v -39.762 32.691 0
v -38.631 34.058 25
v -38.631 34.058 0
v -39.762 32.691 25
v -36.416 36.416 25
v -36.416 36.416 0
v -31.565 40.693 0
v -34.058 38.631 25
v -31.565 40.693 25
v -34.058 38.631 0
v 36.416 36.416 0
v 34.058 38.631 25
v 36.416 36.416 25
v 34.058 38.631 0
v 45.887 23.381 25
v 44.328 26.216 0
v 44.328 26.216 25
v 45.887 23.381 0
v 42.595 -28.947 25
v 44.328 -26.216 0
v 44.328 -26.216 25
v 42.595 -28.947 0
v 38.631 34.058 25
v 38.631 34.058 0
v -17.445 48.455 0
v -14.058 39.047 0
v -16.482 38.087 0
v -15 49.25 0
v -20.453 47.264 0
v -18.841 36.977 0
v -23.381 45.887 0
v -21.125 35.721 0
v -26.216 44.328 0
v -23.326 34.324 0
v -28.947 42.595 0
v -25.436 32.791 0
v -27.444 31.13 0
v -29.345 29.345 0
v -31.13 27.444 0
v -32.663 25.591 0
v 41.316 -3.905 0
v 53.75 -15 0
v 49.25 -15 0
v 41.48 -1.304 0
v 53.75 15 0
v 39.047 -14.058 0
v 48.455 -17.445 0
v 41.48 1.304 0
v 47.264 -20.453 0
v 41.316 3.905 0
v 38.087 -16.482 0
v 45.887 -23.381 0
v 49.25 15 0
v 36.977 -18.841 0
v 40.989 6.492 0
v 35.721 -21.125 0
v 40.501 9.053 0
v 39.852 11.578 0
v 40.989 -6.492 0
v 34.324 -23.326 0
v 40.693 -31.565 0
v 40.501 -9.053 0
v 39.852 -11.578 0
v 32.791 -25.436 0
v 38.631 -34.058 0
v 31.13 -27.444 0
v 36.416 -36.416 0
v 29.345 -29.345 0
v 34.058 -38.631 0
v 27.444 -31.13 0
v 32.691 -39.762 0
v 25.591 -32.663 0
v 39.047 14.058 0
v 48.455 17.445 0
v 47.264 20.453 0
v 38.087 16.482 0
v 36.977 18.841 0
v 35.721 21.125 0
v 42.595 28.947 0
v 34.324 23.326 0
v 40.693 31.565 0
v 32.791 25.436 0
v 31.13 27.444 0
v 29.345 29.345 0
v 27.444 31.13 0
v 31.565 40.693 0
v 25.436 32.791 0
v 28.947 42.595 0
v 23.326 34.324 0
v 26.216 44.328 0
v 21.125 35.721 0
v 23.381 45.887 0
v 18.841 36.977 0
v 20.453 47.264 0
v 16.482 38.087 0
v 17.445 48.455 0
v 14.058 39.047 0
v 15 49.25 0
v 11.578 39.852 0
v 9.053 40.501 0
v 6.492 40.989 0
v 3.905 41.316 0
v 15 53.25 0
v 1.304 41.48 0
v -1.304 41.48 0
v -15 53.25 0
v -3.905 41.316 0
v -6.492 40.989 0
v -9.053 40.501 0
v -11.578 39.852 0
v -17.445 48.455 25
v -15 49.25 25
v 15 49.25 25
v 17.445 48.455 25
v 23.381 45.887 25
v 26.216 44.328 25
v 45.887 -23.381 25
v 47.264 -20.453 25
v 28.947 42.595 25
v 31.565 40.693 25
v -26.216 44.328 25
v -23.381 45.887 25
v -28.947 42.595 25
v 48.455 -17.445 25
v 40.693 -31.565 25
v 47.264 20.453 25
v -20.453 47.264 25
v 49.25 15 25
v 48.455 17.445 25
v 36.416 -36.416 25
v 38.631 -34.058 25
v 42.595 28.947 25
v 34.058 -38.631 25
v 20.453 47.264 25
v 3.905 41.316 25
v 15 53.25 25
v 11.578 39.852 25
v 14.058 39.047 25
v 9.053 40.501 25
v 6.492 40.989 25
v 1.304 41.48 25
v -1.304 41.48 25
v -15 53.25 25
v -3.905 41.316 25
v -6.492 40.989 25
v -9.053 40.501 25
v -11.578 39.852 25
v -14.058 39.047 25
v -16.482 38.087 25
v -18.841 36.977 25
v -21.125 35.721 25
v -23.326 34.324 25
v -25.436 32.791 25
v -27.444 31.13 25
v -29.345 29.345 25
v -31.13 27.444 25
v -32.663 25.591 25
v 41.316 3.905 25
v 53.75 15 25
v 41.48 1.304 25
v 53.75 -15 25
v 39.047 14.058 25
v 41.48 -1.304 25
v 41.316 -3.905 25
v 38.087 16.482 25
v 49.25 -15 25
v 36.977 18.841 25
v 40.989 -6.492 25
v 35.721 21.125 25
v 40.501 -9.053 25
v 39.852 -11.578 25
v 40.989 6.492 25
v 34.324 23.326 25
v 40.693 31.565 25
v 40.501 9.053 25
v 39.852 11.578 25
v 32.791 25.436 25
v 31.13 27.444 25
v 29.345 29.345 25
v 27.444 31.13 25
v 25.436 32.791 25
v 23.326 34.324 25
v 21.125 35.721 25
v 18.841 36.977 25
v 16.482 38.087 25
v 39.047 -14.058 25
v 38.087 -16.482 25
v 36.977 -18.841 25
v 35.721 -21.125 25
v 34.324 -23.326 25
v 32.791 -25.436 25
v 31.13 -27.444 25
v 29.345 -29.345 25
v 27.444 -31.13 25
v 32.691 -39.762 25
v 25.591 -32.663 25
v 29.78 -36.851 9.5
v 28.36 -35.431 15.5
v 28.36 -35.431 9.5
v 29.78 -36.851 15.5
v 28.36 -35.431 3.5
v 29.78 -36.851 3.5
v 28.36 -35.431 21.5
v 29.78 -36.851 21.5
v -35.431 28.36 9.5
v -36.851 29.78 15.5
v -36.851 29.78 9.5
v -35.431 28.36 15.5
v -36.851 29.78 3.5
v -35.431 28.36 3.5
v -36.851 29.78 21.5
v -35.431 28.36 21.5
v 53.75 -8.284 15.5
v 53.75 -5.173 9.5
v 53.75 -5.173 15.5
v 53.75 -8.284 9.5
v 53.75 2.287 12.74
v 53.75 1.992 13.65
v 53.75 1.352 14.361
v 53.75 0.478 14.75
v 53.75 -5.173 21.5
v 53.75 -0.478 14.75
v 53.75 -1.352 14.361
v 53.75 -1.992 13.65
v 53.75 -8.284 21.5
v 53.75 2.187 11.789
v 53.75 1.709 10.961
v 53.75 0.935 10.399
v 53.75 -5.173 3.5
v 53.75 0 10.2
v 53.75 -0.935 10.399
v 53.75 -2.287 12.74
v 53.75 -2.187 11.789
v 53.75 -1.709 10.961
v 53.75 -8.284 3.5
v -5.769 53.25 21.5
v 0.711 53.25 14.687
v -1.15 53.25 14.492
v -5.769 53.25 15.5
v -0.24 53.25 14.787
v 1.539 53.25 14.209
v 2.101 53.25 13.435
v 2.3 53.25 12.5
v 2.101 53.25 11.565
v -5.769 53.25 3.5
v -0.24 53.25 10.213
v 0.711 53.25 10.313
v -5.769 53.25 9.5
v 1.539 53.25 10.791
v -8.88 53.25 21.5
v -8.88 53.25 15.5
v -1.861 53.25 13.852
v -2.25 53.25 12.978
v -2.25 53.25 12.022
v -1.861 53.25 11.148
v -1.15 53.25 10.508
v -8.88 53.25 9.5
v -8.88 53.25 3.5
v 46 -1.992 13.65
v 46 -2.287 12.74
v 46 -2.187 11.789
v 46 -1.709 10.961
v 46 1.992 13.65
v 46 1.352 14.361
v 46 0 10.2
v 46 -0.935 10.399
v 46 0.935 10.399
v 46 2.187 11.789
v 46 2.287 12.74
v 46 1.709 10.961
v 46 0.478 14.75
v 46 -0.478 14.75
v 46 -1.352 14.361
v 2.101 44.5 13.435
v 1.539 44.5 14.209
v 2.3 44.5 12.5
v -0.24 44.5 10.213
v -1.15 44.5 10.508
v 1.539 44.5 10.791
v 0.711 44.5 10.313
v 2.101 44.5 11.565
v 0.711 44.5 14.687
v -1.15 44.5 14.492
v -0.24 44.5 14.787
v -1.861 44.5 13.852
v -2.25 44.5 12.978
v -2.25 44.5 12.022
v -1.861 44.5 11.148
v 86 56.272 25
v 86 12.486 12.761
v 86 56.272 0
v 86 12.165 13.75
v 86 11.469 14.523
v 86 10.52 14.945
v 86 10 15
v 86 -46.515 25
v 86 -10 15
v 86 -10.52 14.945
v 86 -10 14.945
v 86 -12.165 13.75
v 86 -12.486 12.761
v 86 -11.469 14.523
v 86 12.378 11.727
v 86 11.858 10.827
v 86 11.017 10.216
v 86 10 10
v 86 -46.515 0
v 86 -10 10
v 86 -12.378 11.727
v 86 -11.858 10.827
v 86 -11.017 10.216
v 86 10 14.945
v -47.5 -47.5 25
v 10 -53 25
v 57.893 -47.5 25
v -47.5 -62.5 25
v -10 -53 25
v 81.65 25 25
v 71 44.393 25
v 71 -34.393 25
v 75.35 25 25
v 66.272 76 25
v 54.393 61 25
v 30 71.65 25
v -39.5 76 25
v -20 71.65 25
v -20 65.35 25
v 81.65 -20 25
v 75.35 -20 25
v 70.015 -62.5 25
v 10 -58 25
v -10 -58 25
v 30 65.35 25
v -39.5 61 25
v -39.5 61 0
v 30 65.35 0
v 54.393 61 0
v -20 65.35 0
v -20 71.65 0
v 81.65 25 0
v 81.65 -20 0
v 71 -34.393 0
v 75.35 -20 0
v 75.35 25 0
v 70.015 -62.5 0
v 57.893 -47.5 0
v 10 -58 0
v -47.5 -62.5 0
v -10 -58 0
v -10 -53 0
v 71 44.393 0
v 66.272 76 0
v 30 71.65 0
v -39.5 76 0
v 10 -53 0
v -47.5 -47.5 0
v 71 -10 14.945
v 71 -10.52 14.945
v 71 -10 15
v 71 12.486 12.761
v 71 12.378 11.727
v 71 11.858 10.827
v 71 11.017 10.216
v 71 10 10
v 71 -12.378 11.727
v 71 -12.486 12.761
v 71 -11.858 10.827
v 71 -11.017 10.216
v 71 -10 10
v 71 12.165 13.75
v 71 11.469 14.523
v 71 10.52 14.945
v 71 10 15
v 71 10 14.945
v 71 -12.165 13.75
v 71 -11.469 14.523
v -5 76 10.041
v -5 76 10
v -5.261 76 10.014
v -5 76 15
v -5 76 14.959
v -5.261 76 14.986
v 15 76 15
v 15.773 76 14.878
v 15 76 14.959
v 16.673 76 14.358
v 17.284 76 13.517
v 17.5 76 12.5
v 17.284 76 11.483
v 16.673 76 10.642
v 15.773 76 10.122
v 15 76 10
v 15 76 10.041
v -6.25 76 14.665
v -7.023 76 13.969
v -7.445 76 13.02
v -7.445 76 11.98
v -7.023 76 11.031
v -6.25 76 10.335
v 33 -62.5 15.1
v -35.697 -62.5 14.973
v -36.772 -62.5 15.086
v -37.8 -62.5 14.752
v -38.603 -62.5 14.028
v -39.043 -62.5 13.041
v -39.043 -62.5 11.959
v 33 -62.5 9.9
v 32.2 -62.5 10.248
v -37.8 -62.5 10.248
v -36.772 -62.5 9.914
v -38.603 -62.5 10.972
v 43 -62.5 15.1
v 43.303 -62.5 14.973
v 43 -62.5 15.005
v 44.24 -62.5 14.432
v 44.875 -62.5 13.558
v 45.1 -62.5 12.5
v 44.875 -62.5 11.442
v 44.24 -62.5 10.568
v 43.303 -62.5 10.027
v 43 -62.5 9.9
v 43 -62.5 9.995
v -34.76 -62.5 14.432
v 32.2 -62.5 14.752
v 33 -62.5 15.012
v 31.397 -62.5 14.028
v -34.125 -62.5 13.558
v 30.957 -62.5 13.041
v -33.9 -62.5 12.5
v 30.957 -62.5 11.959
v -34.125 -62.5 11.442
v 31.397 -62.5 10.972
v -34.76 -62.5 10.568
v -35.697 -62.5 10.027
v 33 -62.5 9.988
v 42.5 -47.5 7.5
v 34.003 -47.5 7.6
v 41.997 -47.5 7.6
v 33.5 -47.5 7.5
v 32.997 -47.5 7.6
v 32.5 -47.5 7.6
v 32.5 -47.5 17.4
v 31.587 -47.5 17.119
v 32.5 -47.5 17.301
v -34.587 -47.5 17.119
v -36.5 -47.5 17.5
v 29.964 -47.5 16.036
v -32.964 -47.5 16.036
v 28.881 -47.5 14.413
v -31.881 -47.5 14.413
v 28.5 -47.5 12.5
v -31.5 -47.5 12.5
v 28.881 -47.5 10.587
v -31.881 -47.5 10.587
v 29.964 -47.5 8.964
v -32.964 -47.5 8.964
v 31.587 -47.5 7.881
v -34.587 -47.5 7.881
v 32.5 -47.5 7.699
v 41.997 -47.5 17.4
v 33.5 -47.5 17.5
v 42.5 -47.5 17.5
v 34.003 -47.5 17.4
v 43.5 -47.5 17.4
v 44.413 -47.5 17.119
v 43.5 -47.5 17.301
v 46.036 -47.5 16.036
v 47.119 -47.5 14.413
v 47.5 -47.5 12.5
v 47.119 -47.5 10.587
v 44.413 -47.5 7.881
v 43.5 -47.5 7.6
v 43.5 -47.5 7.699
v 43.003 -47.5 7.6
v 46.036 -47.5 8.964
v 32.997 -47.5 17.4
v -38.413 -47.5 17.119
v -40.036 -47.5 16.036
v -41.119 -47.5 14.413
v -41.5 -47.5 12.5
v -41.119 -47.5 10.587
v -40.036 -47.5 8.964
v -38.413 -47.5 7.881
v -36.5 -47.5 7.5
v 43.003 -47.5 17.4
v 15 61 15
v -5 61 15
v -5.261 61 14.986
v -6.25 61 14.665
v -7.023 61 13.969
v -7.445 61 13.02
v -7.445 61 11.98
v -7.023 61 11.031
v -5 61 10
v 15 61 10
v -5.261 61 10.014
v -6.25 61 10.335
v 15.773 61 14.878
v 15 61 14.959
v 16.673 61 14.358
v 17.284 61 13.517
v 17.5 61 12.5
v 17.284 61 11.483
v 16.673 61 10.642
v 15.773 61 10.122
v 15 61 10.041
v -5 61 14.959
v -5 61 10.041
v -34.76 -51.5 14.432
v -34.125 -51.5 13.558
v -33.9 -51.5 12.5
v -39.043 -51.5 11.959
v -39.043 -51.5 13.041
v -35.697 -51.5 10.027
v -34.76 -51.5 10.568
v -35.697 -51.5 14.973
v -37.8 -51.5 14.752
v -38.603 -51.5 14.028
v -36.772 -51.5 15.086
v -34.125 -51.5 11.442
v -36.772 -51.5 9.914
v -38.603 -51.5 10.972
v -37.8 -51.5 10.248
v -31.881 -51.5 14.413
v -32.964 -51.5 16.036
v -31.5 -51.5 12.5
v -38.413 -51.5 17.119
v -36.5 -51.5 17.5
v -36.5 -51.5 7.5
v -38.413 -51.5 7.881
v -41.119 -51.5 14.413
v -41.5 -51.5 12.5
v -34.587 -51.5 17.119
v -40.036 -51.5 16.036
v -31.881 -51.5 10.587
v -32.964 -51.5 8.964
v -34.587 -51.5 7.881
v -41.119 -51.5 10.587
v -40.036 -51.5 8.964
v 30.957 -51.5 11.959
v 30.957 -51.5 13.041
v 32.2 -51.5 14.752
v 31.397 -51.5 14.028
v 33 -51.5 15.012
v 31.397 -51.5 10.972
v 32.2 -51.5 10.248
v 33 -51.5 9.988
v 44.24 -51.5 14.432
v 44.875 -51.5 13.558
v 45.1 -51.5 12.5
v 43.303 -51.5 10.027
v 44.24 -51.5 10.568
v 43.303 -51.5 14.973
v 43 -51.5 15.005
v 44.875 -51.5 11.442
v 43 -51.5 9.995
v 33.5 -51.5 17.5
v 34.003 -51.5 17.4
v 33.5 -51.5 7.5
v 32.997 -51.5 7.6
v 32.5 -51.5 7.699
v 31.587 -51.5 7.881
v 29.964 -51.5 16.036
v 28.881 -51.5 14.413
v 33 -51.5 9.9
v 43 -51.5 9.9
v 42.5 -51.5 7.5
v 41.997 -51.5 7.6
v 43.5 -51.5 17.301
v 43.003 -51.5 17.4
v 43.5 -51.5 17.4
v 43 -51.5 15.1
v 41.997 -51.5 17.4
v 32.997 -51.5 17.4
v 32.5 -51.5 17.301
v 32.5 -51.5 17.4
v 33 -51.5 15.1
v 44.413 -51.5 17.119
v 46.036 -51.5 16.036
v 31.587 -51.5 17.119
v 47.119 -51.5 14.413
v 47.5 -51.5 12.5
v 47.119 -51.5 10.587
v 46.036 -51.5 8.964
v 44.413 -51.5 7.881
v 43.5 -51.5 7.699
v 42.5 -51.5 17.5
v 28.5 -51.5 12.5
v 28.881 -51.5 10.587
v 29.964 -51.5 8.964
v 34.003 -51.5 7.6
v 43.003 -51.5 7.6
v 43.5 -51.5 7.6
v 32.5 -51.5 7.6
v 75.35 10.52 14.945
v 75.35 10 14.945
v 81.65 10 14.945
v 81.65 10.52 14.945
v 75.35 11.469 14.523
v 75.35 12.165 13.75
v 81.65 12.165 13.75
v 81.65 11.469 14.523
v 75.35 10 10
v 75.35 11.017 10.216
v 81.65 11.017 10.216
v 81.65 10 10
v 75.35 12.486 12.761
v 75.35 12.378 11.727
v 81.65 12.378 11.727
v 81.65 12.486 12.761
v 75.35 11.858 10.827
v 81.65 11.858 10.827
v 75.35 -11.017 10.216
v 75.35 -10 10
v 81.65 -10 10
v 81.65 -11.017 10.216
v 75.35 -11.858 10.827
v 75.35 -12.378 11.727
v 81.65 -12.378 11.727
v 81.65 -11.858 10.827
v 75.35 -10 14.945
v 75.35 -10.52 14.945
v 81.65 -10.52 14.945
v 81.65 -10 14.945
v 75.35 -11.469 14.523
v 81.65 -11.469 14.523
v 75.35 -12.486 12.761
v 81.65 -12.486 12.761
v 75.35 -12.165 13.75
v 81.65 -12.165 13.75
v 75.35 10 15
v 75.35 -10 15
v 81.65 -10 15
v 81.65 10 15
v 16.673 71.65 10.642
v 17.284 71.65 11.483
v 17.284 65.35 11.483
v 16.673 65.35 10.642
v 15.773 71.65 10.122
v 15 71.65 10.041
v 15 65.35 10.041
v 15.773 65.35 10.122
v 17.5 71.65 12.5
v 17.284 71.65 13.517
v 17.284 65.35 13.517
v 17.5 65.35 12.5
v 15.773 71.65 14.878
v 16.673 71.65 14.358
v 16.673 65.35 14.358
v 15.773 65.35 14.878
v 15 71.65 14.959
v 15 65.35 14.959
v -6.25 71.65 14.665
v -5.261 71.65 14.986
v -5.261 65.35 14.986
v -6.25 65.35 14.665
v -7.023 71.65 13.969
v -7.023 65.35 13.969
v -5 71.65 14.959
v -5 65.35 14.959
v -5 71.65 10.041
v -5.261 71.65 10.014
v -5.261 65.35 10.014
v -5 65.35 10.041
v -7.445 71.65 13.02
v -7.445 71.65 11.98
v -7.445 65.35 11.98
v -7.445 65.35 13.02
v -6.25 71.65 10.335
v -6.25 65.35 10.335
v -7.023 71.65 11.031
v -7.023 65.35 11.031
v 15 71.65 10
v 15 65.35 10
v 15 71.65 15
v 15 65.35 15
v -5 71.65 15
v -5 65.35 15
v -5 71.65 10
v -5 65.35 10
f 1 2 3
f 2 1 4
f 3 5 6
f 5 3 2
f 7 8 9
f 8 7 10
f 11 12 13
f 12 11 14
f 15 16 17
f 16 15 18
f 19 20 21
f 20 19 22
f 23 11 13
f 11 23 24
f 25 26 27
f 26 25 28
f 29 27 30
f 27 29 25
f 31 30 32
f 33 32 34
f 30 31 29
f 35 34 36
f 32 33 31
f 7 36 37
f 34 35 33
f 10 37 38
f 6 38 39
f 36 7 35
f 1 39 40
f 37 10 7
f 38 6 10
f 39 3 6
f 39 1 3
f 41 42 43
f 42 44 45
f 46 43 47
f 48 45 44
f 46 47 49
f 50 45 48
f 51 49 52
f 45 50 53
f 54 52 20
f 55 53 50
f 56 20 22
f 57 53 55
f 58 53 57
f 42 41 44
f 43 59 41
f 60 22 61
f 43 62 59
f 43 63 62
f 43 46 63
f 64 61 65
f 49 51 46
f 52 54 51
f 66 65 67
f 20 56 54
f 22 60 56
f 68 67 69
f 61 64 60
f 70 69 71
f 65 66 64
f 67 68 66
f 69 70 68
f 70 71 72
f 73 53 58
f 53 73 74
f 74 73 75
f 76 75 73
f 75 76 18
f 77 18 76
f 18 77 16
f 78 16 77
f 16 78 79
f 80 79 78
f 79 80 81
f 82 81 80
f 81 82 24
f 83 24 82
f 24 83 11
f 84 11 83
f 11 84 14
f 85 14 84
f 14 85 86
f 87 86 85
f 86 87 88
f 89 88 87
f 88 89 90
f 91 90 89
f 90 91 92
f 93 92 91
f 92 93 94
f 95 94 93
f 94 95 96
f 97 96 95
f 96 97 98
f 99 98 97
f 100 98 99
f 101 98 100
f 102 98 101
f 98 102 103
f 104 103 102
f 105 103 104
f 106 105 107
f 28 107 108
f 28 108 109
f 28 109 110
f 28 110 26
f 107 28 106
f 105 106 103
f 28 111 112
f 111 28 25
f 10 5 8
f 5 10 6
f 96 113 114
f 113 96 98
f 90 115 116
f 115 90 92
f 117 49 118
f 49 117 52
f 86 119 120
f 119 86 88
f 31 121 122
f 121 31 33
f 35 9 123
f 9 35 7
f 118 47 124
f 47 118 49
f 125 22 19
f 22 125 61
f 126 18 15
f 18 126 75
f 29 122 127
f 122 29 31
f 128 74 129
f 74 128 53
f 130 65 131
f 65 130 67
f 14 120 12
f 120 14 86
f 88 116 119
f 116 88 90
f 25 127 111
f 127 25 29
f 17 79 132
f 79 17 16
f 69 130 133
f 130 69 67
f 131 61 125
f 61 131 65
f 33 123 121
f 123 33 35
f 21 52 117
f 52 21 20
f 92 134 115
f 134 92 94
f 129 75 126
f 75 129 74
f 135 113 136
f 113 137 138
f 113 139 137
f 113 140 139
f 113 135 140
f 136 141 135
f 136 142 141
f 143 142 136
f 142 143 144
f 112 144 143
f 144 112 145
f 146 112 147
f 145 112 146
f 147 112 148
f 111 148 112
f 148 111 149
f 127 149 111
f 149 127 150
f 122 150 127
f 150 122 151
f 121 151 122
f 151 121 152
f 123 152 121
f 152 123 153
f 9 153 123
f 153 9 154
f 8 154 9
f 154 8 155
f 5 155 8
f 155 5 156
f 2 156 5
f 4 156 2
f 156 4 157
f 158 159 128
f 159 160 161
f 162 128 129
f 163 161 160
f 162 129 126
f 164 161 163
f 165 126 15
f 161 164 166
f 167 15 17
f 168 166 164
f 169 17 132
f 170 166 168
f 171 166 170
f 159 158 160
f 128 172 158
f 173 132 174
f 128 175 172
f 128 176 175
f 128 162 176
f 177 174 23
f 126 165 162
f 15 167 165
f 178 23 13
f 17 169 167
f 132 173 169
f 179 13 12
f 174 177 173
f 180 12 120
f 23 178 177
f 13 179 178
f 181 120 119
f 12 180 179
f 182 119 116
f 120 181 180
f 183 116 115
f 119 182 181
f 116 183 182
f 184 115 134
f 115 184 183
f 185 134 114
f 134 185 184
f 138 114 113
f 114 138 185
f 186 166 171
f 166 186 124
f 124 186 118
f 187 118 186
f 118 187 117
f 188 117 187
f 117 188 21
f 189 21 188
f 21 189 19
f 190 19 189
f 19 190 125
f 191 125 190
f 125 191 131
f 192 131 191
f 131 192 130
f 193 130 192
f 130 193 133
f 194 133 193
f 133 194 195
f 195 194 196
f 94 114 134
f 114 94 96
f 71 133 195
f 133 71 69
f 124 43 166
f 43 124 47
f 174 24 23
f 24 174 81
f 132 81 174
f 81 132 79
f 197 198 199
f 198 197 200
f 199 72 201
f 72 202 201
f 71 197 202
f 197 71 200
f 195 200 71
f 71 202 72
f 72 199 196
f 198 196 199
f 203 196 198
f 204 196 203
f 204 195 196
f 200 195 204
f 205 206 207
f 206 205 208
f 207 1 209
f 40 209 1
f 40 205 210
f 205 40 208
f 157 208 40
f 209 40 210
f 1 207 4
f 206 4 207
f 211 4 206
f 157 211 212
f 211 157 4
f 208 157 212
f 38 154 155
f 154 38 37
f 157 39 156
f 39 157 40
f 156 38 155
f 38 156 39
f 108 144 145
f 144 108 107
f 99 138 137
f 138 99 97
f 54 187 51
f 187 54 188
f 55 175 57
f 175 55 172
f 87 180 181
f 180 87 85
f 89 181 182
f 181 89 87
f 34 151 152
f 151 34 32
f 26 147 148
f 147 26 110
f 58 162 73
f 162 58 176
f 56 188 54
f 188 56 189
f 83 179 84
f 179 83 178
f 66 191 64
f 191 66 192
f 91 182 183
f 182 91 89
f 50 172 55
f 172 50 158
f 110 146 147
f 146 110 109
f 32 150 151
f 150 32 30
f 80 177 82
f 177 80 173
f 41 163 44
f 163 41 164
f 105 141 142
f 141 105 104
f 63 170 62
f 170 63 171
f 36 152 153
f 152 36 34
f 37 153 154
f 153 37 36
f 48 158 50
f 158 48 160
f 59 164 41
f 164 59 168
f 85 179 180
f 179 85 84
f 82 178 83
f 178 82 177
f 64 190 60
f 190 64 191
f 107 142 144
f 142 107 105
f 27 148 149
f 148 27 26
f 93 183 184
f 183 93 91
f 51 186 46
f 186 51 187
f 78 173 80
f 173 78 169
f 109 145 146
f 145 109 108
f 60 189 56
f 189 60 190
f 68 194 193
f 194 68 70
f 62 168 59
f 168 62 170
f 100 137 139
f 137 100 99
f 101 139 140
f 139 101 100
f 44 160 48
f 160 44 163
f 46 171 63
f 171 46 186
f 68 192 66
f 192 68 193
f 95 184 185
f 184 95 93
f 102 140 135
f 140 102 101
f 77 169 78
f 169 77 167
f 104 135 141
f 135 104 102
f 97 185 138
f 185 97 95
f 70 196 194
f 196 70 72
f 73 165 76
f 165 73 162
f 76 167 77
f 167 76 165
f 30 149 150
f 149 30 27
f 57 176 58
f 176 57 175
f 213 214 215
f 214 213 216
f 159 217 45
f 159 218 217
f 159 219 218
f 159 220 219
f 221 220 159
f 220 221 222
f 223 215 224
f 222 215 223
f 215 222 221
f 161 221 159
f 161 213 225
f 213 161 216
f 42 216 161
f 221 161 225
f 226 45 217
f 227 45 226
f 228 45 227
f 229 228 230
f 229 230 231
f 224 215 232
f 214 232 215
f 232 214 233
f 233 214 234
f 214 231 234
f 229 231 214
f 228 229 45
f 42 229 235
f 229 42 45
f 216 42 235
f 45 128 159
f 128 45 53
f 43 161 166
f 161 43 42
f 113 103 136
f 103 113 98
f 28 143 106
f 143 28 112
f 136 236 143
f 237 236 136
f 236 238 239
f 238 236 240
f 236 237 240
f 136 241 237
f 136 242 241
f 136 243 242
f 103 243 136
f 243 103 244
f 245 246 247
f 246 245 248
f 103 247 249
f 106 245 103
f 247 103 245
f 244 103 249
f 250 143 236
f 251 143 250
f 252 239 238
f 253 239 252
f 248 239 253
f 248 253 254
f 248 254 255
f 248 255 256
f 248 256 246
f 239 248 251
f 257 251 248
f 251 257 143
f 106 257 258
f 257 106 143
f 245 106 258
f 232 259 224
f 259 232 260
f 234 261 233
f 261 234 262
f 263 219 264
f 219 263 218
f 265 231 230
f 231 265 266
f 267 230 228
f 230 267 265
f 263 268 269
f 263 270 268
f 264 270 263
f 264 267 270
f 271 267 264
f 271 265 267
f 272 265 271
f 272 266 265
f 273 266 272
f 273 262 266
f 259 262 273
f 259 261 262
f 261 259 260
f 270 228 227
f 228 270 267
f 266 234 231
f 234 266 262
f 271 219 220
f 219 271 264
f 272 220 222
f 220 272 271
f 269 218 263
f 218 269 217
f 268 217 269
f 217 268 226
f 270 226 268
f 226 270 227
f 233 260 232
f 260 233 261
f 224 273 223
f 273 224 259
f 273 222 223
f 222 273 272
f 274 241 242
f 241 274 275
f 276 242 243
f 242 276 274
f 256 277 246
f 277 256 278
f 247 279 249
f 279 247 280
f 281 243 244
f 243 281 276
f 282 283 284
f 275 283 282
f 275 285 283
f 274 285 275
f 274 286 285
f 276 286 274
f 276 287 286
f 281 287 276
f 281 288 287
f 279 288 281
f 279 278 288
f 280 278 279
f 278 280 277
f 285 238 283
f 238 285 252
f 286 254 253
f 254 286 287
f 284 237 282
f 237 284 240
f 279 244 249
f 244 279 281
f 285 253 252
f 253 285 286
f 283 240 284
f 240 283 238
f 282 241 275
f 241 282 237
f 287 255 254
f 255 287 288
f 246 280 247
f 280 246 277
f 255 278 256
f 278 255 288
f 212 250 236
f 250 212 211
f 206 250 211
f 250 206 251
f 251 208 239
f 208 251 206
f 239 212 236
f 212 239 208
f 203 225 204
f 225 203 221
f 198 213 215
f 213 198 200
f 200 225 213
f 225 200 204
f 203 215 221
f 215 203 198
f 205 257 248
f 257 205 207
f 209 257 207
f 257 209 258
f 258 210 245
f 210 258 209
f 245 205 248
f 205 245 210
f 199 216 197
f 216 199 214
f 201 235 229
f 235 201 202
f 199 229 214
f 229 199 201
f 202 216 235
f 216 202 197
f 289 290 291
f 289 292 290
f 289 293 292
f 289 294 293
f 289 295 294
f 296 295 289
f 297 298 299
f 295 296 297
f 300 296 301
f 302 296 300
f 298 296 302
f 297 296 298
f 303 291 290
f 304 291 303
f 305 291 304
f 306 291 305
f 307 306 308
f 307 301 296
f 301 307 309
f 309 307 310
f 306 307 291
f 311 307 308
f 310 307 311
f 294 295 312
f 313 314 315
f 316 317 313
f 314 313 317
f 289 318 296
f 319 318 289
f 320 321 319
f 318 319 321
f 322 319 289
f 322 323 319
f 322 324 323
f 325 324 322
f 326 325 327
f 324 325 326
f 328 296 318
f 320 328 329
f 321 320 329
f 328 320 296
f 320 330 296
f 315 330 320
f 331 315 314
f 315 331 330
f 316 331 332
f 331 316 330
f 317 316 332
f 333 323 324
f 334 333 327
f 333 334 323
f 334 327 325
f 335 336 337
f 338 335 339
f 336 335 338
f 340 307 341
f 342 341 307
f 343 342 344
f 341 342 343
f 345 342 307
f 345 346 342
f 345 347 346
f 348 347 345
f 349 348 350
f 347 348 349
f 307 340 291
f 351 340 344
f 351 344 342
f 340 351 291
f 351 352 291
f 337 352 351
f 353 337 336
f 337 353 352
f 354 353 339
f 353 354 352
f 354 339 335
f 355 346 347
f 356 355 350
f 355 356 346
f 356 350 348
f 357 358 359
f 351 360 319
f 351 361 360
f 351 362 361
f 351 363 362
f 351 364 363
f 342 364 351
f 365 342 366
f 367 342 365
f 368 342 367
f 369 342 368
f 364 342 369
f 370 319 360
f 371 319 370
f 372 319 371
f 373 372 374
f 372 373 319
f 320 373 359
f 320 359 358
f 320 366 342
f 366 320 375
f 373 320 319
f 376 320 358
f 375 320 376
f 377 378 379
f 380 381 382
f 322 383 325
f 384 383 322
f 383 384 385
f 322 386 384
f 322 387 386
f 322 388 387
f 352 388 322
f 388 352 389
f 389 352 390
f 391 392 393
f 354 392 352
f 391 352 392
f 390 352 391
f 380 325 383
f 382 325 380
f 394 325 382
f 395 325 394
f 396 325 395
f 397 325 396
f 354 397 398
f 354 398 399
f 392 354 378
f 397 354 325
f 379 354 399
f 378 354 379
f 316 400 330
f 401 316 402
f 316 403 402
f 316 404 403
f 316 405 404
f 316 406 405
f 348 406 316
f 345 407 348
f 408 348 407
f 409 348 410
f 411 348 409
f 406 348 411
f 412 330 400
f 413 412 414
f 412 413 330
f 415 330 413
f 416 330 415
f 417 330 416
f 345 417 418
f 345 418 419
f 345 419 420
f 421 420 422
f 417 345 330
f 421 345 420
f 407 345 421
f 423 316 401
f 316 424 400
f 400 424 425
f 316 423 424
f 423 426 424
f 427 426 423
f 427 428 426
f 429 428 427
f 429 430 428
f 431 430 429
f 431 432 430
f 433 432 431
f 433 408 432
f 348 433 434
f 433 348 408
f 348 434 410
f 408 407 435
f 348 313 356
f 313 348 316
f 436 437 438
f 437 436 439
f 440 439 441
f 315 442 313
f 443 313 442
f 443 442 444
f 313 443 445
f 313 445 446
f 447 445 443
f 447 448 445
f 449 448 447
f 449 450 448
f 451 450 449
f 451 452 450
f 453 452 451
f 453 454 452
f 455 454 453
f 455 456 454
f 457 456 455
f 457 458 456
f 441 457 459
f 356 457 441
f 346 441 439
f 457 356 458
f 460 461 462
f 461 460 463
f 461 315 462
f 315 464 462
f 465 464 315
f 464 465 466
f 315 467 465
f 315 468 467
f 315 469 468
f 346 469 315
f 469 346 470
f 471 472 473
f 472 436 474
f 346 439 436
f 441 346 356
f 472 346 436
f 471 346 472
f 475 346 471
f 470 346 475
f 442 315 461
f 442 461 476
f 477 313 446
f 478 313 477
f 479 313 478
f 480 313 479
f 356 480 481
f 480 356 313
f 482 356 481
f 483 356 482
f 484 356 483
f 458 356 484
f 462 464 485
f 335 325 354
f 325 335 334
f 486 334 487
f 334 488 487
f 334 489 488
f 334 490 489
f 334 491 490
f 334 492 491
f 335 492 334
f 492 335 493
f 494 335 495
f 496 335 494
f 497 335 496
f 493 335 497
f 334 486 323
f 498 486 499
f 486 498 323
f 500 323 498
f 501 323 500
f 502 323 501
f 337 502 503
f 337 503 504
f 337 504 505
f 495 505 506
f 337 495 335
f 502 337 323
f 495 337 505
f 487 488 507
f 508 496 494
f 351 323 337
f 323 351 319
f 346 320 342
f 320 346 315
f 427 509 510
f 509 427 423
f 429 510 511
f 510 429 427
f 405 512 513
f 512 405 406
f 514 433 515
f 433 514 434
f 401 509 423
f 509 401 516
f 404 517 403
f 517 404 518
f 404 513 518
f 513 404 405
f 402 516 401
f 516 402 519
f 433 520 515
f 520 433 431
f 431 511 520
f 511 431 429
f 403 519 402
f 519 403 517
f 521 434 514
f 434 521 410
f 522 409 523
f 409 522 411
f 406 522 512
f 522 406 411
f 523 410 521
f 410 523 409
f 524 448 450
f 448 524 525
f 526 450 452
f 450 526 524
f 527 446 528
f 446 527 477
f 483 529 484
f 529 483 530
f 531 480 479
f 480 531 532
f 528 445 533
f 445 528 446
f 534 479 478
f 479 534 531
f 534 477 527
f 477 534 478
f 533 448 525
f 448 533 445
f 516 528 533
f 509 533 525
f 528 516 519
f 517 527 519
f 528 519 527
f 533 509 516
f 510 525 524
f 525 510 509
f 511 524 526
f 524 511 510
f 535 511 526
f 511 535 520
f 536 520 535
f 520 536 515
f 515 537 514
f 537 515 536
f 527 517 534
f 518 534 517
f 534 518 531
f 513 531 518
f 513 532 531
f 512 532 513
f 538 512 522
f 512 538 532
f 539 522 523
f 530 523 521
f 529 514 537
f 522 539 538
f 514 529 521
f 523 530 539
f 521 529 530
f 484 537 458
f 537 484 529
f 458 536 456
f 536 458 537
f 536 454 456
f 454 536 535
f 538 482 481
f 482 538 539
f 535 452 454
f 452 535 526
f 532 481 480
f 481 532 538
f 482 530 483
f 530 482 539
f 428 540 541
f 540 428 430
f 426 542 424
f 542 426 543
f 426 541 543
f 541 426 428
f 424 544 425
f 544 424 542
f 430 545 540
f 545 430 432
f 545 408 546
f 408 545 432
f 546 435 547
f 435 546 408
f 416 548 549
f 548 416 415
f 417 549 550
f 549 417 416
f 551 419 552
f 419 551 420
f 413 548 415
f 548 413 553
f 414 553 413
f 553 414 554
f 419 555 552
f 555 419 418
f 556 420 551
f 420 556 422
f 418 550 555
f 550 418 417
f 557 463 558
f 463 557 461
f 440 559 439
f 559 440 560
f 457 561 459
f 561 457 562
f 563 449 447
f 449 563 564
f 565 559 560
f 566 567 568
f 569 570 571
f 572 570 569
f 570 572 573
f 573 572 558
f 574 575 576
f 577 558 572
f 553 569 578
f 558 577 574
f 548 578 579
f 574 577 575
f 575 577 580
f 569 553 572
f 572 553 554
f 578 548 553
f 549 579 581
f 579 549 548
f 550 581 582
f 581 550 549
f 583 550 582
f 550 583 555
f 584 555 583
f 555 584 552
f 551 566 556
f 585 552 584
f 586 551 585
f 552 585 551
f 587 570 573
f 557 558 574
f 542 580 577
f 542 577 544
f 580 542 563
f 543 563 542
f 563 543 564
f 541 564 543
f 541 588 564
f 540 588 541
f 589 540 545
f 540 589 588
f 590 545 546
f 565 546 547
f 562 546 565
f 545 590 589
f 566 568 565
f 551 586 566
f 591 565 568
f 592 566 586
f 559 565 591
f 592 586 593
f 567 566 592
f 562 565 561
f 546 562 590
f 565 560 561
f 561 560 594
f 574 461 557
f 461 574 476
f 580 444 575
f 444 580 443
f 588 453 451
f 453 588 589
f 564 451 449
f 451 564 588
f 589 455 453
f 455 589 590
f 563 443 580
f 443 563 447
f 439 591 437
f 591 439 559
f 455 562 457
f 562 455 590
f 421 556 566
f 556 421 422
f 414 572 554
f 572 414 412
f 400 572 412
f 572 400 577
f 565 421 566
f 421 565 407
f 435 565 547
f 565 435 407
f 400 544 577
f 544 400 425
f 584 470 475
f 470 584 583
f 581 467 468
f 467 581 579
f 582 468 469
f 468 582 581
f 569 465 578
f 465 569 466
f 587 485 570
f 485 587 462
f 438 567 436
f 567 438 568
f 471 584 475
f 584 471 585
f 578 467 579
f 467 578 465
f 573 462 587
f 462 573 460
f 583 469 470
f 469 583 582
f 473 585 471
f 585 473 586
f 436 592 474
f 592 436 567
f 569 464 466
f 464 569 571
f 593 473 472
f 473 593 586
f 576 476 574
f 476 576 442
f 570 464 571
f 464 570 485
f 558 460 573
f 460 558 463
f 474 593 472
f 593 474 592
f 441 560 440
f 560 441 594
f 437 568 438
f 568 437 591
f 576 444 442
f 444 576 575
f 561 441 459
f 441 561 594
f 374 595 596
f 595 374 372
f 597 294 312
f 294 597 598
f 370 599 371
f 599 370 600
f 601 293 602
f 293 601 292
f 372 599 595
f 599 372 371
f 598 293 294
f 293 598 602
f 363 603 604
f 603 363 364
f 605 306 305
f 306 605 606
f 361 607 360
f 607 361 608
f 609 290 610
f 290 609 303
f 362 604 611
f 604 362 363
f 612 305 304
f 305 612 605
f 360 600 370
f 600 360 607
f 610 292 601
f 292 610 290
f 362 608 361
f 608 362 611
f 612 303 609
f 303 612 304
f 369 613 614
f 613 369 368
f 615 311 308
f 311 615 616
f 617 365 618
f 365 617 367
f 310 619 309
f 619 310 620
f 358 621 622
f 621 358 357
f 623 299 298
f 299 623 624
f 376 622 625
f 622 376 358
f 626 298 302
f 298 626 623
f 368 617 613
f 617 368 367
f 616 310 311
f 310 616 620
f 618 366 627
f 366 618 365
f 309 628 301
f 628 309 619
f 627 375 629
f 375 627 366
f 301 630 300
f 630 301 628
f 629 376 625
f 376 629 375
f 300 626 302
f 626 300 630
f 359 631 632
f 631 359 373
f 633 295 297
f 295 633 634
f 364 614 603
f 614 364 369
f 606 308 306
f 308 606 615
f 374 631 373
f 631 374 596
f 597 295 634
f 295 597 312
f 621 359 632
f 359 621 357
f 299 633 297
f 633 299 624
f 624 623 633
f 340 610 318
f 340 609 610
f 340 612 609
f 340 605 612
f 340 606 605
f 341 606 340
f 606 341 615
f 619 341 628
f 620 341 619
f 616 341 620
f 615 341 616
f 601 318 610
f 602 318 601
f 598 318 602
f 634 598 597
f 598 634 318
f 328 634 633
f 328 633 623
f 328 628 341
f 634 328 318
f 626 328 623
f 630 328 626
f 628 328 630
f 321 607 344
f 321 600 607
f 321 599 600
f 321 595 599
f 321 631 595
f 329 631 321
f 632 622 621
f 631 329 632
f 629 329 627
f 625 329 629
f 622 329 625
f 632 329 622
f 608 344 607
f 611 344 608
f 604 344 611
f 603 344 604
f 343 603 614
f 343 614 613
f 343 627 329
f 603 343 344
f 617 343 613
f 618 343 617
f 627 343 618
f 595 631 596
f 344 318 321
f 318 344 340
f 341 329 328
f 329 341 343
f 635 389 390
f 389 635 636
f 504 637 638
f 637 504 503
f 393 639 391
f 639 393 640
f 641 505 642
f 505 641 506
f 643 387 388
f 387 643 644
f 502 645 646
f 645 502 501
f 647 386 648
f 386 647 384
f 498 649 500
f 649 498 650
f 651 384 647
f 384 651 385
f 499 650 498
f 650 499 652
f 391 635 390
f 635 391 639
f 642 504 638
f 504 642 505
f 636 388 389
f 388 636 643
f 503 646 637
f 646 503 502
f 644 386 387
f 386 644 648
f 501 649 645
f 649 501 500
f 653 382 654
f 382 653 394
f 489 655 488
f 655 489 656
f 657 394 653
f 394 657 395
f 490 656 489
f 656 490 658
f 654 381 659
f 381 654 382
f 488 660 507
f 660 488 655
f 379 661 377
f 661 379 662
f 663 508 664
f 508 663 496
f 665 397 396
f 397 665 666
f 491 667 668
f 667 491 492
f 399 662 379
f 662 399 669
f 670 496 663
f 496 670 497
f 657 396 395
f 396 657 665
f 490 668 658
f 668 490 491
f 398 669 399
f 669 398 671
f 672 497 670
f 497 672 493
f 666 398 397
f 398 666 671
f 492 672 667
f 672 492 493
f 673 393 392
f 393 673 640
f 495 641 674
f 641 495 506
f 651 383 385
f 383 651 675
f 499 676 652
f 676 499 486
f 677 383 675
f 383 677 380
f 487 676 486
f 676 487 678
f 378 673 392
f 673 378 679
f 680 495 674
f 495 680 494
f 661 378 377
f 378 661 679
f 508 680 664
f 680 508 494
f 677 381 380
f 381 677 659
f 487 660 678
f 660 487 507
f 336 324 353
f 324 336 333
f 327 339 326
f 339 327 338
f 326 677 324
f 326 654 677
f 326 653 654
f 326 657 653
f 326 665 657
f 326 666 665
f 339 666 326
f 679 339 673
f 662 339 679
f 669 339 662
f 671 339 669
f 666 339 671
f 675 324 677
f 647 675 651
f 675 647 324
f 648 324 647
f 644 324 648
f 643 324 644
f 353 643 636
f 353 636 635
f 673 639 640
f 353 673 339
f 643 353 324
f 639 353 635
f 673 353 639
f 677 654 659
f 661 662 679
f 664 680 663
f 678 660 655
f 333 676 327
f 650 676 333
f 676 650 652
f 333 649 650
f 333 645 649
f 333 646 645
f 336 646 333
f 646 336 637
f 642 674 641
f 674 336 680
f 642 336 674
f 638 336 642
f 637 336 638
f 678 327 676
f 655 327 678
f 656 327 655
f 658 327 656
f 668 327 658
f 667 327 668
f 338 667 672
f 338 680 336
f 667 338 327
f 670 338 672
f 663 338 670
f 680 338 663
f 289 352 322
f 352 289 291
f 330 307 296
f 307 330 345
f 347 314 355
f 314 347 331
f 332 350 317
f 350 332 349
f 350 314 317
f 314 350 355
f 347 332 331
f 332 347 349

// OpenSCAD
// === V4: Removed all nut inserts in the inner holder/support, made screw holes smaller and not thru. This is so you can tap screws directly into mount without any nuts.
// --- V5: Outer bracket mounting holes need to be 48 mm apart (not 45)
// --- V6: Longer external bracket (10mm towards back) to fit tube. Added elongated mounted screw hole
tube_d=80;
//tube_d=55;
tube_r=tube_d/2;
// ==========================================================================================================
// ---- Tube hanger (inner support) ---
// ==========================================================================================================
module hanger(){ 
difference(){
union(){
    
rotate([0,0,-45+180]){
difference(){ // Center tube holder
cylinder(r=tube_r+1.5+10,h=25,$fn=100,center=true); // OD

//translate([0,25,0])  cube([80,70,25],center=true); // Cut more than half of holder
  translate([0,35,-0.01])  cube([120,60,25.2],center=true); // Cut half of holder

cylinder(r=tube_r+1.5,h=25.1,$fn=100,center=true); // ID
}
}

translate([tube_r+10,0,0])  cube([7.5,30,25],center=true); // Back square protrusion
translate([0,tube_r+9.5,0])  cube([30,7.5,25],center=true);// Top square protrusion
}
translate ([tube_r+11,0,0]) rotate([0,90,0]) cylinder(r=2.3,h=10,$fn=15,center=true); // Back screw hole
translate ([0,tube_r+9.5,0]) rotate([90,0,0]) cylinder(r=2.3,h=10,$fn=15,center=true);// Top screw hole


// Top opening for zip-ties
rotate([0,0,45-5]) translate([0,tube_r+6.5-1,6])   cube([100,2,6],center=true);
rotate([0,0,-90-45+5]) translate([0,tube_r+6.5-1,6])   cube([100,2,6],center=true);
// Bottom opening for zip-ties
rotate([0,0,45-5]) translate([0,tube_r+6.5-1,-6])   cube([100,2,6],center=true);
rotate([0,0,-90-45+5]) translate([0,tube_r+6.5-1,-6])   cube([100,2,6],center=true);



// Nut holes
//translate([28.8,0,0]) rotate([30,0,0]) rotate([0,90,0]) cylinder(r=5.65,h=8,$fn=6,center=true); // Inner
//translate([40,0,0]) rotate([30,0,0]) rotate([0,90,0]) cylinder(r=5.65,h=3,$fn=6,center=true); // Outer
//translate([0,28.8,0]) rotate([90,0,0]) cylinder(r=5.65,h=8,$fn=6,center=true); // Inner
//translate([0,40,0]) rotate([90,0,0]) cylinder(r=5.65,h=3,$fn=6,center=true); // Outer

}

}


// ==========================================================================================================
// ---- External Bracket ---
// ==========================================================================================================
module ex_bracket () {
  difference(){ 
    union(){
        translate([38.5+tube_r,6.75,0]) cube([15,tube_d+58.5,25],center=true); // Back end
        translate([15,-15-tube_r,0]) cube([tube_d+45,15,25],center=true); // Bottom
        translate([17.5,tube_r+28.5,0]) cube([34+tube_d,15,25],center=true); // Top
        translate([28.5+tube_r,17.5+tube_r,0]) rotate([0,0,45]) cube([15,25,25],center=true); // Upper inner corner cut
        translate([28.5+tube_r,-tube_r-7.5,0]) rotate([0,0,-45]) cube([15,25,25],center=true); // Lower inner corner cut
    }

    // ---------------------------------------------------------------------------------------------------------
    // --- Bracket Mounting Holes
    translate([-tube_r+3.5,0,0]) translate ([0,-50.5-tube_r,0]) rotate([90,0,0]) cylinder(r=2.6,h=100,$fn=15,center=true); //Mounting hole #1
    translate([-tube_r+3.5,0,0]) translate ([0,-tube_r-6.5,0]) rotate([90,0,0]) cylinder(r=5,h=10,center=true); //Head slot for mounting screw #1
    
    // --- Elongated Mounting hole #2
    translate([tube_r-6.5,0,0]) translate ([0,-tube_r-50.5,0]) rotate([90,0,0]) cylinder(r=2.6,h=100,$fn=15,center=true);//Mounting hole #2.1
    translate([tube_r+2.5,0,0]) translate ([0,-tube_r-50.5,0]) rotate([90,0,0]) cylinder(r=2.6,h=100,$fn=15,center=true);//Mounting hole #2.2
    translate([tube_r-6.5,0,0]) translate ([0,-tube_r-6.5,0]) rotate([90,0,0]) cylinder(r=5,h=10,center=true); //Head slot for mounting screw #2.1
    translate([tube_r-2,-tube_r-17.5,0]) cube([10,15,5.2],center=true); // Slot that joins two mounting hole #2 parts
    translate([tube_r+2.5,0,0]) translate ([0,-tube_r-6.5,0]) rotate([90,0,0]) cylinder(r=5,h=10,center=true); //Head slot for mounting screw #2.2
    translate([tube_r-2,-tube_r-8.5,0]) cube([11,6,9.8],center=true); // Slot that joins two mounting Head hole #2 parts 
    
    
    
    // ---------------------------------------------------------------------------------------------------------
    // --- Front Adjustment Screw Slots (moves tube up/down) ----
    translate([0,10,0]) rotate([0,90,0]) cylinder(r=2.5,h=200,$fn=15,center=true); // Screw slot end upper(back side)
    translate([0,-10,0]) rotate([0,90,0]) cylinder(r=2.5,h=200,$fn=15,center=true); // Screw slot end lower (back side)
    translate([38.5+tube_r,0,0]) cube([15.1,20,5],center=true); // --- Front adj opening (Square connection joining two holes)
    translate([38.5+tube_r,2.5,0]) cube([6.3,45,25.1],center=true);// Adjustment nut slot (front)
    
    // ---------------------------------------------------------------------------------------------------------
    // --- Upper Adjustment Screw Slots (moves tube Front/Back) ----
    translate([15,tube_r+2.5,0]) rotate([90,0,0]) cylinder(r=2.5,h=100,$fn=15,center=true); // Screw slot end back (upper side)
    translate([-5,tube_r+2.5,0]) rotate([90,0,0]) cylinder(r=2.5,h=100,$fn=15,center=true); // Screw slot end front(upper side)
    translate([5,tube_r+28.5,0]) cube([20,15.1,5],center=true); // Slot that joins two holes on upper part
    translate([5,tube_r+28.5,0]) cube([50,6.3,25.1],center=true); // Adjustment nut slot (upper)
    
    // ---------------------------------------------------------------------------------------------------------
    translate([tube_r+42.5,tube_r+32.5,0]) rotate([0,0,45]) cube([18,55,25.2],center=true); // Upper corner cut
    translate([44.5+tube_r,-tube_r-16.5,0]) rotate([0,0,-45]) cube([12,35,25.2],center=true); // Low corner cut
    translate([0,-tube_r-15.5,0])  cube([20,5,25.2],center=true); // Slot in lower part (just to lighten part)
  }
    //translate([0,-50,0]) cube([170,2,25],center=true);

    //UNCOMMENT TO SEE 8mm rod
    //translate([52,0,0]) rotate([0,90,0]) cylinder(r=4,h=50,$fn=15,center=true);
    //translate([0,52,0]) rotate([90,0,0]) cylinder(r=4,h=50,$fn=15,center=true);


    //translate([22,-59,0]) cube([90,15,8],center=true);
    //translate([82,8,0]) cube([15,117,8],center=true);
}

// --- Raise Both to Z=0
translate([0,0,12.5]){
    hanger();
    ex_bracket();
}
